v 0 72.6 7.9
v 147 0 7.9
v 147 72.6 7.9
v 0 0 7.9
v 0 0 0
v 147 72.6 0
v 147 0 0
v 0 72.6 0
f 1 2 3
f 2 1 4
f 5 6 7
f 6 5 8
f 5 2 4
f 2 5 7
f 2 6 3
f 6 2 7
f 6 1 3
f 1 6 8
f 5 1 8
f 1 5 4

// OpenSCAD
nexus5x = [147.0, 72.6, 7.9];
nexus6p = [159.4, 77.8, 7.3];

phone = nexus5x;

height = phone[0];
width = phone[1];
depth = phone[2];

$fn = 30;

// curve_radius = depth/2;

// minkowski() {
//   cube([height-curve_radius, width-curve_radius, depth-curve_radius]);
//   translate([0,0,curve_radius/2]) sphere(r=curve_radius/2);
// }

  cube([height, width, depth]);
